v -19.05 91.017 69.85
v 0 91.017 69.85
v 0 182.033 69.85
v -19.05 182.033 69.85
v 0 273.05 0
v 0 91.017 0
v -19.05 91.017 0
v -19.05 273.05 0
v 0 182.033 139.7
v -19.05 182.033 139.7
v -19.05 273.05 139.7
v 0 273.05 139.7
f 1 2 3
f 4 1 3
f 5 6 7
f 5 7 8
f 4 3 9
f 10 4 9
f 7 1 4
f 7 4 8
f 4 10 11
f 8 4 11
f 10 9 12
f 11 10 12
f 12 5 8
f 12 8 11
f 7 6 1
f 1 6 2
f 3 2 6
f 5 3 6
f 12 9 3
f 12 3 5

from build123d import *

# Parameters (mm, degrees)
F0_W     = 273.05
F0_H     = 228.6
F1_DEPTH = 19.05
F3_DEPTH = 19.05


with BuildPart() as f1:
    # F0 (on Right) → F1 (new body)
    with BuildSketch(Plane.YZ):
        with Locations((136.525, 114.3)):
            Rectangle(F0_W, F0_H)
    extrude(amount=-F1_DEPTH)

    # F2 (on face) → F3 (cut, through all)
    with BuildSketch(Plane.YZ):
        Polygon((182.033333, 139.7), (273.05, 139.7), (273.05, 228.6), (0, 228.6), (0, 0), (91.016667, 0), (91.016667, 69.85), (182.033333, 69.85), align=None)
    extrude(amount=-F3_DEPTH, mode=Mode.SUBTRACT)


solid = f1.part
